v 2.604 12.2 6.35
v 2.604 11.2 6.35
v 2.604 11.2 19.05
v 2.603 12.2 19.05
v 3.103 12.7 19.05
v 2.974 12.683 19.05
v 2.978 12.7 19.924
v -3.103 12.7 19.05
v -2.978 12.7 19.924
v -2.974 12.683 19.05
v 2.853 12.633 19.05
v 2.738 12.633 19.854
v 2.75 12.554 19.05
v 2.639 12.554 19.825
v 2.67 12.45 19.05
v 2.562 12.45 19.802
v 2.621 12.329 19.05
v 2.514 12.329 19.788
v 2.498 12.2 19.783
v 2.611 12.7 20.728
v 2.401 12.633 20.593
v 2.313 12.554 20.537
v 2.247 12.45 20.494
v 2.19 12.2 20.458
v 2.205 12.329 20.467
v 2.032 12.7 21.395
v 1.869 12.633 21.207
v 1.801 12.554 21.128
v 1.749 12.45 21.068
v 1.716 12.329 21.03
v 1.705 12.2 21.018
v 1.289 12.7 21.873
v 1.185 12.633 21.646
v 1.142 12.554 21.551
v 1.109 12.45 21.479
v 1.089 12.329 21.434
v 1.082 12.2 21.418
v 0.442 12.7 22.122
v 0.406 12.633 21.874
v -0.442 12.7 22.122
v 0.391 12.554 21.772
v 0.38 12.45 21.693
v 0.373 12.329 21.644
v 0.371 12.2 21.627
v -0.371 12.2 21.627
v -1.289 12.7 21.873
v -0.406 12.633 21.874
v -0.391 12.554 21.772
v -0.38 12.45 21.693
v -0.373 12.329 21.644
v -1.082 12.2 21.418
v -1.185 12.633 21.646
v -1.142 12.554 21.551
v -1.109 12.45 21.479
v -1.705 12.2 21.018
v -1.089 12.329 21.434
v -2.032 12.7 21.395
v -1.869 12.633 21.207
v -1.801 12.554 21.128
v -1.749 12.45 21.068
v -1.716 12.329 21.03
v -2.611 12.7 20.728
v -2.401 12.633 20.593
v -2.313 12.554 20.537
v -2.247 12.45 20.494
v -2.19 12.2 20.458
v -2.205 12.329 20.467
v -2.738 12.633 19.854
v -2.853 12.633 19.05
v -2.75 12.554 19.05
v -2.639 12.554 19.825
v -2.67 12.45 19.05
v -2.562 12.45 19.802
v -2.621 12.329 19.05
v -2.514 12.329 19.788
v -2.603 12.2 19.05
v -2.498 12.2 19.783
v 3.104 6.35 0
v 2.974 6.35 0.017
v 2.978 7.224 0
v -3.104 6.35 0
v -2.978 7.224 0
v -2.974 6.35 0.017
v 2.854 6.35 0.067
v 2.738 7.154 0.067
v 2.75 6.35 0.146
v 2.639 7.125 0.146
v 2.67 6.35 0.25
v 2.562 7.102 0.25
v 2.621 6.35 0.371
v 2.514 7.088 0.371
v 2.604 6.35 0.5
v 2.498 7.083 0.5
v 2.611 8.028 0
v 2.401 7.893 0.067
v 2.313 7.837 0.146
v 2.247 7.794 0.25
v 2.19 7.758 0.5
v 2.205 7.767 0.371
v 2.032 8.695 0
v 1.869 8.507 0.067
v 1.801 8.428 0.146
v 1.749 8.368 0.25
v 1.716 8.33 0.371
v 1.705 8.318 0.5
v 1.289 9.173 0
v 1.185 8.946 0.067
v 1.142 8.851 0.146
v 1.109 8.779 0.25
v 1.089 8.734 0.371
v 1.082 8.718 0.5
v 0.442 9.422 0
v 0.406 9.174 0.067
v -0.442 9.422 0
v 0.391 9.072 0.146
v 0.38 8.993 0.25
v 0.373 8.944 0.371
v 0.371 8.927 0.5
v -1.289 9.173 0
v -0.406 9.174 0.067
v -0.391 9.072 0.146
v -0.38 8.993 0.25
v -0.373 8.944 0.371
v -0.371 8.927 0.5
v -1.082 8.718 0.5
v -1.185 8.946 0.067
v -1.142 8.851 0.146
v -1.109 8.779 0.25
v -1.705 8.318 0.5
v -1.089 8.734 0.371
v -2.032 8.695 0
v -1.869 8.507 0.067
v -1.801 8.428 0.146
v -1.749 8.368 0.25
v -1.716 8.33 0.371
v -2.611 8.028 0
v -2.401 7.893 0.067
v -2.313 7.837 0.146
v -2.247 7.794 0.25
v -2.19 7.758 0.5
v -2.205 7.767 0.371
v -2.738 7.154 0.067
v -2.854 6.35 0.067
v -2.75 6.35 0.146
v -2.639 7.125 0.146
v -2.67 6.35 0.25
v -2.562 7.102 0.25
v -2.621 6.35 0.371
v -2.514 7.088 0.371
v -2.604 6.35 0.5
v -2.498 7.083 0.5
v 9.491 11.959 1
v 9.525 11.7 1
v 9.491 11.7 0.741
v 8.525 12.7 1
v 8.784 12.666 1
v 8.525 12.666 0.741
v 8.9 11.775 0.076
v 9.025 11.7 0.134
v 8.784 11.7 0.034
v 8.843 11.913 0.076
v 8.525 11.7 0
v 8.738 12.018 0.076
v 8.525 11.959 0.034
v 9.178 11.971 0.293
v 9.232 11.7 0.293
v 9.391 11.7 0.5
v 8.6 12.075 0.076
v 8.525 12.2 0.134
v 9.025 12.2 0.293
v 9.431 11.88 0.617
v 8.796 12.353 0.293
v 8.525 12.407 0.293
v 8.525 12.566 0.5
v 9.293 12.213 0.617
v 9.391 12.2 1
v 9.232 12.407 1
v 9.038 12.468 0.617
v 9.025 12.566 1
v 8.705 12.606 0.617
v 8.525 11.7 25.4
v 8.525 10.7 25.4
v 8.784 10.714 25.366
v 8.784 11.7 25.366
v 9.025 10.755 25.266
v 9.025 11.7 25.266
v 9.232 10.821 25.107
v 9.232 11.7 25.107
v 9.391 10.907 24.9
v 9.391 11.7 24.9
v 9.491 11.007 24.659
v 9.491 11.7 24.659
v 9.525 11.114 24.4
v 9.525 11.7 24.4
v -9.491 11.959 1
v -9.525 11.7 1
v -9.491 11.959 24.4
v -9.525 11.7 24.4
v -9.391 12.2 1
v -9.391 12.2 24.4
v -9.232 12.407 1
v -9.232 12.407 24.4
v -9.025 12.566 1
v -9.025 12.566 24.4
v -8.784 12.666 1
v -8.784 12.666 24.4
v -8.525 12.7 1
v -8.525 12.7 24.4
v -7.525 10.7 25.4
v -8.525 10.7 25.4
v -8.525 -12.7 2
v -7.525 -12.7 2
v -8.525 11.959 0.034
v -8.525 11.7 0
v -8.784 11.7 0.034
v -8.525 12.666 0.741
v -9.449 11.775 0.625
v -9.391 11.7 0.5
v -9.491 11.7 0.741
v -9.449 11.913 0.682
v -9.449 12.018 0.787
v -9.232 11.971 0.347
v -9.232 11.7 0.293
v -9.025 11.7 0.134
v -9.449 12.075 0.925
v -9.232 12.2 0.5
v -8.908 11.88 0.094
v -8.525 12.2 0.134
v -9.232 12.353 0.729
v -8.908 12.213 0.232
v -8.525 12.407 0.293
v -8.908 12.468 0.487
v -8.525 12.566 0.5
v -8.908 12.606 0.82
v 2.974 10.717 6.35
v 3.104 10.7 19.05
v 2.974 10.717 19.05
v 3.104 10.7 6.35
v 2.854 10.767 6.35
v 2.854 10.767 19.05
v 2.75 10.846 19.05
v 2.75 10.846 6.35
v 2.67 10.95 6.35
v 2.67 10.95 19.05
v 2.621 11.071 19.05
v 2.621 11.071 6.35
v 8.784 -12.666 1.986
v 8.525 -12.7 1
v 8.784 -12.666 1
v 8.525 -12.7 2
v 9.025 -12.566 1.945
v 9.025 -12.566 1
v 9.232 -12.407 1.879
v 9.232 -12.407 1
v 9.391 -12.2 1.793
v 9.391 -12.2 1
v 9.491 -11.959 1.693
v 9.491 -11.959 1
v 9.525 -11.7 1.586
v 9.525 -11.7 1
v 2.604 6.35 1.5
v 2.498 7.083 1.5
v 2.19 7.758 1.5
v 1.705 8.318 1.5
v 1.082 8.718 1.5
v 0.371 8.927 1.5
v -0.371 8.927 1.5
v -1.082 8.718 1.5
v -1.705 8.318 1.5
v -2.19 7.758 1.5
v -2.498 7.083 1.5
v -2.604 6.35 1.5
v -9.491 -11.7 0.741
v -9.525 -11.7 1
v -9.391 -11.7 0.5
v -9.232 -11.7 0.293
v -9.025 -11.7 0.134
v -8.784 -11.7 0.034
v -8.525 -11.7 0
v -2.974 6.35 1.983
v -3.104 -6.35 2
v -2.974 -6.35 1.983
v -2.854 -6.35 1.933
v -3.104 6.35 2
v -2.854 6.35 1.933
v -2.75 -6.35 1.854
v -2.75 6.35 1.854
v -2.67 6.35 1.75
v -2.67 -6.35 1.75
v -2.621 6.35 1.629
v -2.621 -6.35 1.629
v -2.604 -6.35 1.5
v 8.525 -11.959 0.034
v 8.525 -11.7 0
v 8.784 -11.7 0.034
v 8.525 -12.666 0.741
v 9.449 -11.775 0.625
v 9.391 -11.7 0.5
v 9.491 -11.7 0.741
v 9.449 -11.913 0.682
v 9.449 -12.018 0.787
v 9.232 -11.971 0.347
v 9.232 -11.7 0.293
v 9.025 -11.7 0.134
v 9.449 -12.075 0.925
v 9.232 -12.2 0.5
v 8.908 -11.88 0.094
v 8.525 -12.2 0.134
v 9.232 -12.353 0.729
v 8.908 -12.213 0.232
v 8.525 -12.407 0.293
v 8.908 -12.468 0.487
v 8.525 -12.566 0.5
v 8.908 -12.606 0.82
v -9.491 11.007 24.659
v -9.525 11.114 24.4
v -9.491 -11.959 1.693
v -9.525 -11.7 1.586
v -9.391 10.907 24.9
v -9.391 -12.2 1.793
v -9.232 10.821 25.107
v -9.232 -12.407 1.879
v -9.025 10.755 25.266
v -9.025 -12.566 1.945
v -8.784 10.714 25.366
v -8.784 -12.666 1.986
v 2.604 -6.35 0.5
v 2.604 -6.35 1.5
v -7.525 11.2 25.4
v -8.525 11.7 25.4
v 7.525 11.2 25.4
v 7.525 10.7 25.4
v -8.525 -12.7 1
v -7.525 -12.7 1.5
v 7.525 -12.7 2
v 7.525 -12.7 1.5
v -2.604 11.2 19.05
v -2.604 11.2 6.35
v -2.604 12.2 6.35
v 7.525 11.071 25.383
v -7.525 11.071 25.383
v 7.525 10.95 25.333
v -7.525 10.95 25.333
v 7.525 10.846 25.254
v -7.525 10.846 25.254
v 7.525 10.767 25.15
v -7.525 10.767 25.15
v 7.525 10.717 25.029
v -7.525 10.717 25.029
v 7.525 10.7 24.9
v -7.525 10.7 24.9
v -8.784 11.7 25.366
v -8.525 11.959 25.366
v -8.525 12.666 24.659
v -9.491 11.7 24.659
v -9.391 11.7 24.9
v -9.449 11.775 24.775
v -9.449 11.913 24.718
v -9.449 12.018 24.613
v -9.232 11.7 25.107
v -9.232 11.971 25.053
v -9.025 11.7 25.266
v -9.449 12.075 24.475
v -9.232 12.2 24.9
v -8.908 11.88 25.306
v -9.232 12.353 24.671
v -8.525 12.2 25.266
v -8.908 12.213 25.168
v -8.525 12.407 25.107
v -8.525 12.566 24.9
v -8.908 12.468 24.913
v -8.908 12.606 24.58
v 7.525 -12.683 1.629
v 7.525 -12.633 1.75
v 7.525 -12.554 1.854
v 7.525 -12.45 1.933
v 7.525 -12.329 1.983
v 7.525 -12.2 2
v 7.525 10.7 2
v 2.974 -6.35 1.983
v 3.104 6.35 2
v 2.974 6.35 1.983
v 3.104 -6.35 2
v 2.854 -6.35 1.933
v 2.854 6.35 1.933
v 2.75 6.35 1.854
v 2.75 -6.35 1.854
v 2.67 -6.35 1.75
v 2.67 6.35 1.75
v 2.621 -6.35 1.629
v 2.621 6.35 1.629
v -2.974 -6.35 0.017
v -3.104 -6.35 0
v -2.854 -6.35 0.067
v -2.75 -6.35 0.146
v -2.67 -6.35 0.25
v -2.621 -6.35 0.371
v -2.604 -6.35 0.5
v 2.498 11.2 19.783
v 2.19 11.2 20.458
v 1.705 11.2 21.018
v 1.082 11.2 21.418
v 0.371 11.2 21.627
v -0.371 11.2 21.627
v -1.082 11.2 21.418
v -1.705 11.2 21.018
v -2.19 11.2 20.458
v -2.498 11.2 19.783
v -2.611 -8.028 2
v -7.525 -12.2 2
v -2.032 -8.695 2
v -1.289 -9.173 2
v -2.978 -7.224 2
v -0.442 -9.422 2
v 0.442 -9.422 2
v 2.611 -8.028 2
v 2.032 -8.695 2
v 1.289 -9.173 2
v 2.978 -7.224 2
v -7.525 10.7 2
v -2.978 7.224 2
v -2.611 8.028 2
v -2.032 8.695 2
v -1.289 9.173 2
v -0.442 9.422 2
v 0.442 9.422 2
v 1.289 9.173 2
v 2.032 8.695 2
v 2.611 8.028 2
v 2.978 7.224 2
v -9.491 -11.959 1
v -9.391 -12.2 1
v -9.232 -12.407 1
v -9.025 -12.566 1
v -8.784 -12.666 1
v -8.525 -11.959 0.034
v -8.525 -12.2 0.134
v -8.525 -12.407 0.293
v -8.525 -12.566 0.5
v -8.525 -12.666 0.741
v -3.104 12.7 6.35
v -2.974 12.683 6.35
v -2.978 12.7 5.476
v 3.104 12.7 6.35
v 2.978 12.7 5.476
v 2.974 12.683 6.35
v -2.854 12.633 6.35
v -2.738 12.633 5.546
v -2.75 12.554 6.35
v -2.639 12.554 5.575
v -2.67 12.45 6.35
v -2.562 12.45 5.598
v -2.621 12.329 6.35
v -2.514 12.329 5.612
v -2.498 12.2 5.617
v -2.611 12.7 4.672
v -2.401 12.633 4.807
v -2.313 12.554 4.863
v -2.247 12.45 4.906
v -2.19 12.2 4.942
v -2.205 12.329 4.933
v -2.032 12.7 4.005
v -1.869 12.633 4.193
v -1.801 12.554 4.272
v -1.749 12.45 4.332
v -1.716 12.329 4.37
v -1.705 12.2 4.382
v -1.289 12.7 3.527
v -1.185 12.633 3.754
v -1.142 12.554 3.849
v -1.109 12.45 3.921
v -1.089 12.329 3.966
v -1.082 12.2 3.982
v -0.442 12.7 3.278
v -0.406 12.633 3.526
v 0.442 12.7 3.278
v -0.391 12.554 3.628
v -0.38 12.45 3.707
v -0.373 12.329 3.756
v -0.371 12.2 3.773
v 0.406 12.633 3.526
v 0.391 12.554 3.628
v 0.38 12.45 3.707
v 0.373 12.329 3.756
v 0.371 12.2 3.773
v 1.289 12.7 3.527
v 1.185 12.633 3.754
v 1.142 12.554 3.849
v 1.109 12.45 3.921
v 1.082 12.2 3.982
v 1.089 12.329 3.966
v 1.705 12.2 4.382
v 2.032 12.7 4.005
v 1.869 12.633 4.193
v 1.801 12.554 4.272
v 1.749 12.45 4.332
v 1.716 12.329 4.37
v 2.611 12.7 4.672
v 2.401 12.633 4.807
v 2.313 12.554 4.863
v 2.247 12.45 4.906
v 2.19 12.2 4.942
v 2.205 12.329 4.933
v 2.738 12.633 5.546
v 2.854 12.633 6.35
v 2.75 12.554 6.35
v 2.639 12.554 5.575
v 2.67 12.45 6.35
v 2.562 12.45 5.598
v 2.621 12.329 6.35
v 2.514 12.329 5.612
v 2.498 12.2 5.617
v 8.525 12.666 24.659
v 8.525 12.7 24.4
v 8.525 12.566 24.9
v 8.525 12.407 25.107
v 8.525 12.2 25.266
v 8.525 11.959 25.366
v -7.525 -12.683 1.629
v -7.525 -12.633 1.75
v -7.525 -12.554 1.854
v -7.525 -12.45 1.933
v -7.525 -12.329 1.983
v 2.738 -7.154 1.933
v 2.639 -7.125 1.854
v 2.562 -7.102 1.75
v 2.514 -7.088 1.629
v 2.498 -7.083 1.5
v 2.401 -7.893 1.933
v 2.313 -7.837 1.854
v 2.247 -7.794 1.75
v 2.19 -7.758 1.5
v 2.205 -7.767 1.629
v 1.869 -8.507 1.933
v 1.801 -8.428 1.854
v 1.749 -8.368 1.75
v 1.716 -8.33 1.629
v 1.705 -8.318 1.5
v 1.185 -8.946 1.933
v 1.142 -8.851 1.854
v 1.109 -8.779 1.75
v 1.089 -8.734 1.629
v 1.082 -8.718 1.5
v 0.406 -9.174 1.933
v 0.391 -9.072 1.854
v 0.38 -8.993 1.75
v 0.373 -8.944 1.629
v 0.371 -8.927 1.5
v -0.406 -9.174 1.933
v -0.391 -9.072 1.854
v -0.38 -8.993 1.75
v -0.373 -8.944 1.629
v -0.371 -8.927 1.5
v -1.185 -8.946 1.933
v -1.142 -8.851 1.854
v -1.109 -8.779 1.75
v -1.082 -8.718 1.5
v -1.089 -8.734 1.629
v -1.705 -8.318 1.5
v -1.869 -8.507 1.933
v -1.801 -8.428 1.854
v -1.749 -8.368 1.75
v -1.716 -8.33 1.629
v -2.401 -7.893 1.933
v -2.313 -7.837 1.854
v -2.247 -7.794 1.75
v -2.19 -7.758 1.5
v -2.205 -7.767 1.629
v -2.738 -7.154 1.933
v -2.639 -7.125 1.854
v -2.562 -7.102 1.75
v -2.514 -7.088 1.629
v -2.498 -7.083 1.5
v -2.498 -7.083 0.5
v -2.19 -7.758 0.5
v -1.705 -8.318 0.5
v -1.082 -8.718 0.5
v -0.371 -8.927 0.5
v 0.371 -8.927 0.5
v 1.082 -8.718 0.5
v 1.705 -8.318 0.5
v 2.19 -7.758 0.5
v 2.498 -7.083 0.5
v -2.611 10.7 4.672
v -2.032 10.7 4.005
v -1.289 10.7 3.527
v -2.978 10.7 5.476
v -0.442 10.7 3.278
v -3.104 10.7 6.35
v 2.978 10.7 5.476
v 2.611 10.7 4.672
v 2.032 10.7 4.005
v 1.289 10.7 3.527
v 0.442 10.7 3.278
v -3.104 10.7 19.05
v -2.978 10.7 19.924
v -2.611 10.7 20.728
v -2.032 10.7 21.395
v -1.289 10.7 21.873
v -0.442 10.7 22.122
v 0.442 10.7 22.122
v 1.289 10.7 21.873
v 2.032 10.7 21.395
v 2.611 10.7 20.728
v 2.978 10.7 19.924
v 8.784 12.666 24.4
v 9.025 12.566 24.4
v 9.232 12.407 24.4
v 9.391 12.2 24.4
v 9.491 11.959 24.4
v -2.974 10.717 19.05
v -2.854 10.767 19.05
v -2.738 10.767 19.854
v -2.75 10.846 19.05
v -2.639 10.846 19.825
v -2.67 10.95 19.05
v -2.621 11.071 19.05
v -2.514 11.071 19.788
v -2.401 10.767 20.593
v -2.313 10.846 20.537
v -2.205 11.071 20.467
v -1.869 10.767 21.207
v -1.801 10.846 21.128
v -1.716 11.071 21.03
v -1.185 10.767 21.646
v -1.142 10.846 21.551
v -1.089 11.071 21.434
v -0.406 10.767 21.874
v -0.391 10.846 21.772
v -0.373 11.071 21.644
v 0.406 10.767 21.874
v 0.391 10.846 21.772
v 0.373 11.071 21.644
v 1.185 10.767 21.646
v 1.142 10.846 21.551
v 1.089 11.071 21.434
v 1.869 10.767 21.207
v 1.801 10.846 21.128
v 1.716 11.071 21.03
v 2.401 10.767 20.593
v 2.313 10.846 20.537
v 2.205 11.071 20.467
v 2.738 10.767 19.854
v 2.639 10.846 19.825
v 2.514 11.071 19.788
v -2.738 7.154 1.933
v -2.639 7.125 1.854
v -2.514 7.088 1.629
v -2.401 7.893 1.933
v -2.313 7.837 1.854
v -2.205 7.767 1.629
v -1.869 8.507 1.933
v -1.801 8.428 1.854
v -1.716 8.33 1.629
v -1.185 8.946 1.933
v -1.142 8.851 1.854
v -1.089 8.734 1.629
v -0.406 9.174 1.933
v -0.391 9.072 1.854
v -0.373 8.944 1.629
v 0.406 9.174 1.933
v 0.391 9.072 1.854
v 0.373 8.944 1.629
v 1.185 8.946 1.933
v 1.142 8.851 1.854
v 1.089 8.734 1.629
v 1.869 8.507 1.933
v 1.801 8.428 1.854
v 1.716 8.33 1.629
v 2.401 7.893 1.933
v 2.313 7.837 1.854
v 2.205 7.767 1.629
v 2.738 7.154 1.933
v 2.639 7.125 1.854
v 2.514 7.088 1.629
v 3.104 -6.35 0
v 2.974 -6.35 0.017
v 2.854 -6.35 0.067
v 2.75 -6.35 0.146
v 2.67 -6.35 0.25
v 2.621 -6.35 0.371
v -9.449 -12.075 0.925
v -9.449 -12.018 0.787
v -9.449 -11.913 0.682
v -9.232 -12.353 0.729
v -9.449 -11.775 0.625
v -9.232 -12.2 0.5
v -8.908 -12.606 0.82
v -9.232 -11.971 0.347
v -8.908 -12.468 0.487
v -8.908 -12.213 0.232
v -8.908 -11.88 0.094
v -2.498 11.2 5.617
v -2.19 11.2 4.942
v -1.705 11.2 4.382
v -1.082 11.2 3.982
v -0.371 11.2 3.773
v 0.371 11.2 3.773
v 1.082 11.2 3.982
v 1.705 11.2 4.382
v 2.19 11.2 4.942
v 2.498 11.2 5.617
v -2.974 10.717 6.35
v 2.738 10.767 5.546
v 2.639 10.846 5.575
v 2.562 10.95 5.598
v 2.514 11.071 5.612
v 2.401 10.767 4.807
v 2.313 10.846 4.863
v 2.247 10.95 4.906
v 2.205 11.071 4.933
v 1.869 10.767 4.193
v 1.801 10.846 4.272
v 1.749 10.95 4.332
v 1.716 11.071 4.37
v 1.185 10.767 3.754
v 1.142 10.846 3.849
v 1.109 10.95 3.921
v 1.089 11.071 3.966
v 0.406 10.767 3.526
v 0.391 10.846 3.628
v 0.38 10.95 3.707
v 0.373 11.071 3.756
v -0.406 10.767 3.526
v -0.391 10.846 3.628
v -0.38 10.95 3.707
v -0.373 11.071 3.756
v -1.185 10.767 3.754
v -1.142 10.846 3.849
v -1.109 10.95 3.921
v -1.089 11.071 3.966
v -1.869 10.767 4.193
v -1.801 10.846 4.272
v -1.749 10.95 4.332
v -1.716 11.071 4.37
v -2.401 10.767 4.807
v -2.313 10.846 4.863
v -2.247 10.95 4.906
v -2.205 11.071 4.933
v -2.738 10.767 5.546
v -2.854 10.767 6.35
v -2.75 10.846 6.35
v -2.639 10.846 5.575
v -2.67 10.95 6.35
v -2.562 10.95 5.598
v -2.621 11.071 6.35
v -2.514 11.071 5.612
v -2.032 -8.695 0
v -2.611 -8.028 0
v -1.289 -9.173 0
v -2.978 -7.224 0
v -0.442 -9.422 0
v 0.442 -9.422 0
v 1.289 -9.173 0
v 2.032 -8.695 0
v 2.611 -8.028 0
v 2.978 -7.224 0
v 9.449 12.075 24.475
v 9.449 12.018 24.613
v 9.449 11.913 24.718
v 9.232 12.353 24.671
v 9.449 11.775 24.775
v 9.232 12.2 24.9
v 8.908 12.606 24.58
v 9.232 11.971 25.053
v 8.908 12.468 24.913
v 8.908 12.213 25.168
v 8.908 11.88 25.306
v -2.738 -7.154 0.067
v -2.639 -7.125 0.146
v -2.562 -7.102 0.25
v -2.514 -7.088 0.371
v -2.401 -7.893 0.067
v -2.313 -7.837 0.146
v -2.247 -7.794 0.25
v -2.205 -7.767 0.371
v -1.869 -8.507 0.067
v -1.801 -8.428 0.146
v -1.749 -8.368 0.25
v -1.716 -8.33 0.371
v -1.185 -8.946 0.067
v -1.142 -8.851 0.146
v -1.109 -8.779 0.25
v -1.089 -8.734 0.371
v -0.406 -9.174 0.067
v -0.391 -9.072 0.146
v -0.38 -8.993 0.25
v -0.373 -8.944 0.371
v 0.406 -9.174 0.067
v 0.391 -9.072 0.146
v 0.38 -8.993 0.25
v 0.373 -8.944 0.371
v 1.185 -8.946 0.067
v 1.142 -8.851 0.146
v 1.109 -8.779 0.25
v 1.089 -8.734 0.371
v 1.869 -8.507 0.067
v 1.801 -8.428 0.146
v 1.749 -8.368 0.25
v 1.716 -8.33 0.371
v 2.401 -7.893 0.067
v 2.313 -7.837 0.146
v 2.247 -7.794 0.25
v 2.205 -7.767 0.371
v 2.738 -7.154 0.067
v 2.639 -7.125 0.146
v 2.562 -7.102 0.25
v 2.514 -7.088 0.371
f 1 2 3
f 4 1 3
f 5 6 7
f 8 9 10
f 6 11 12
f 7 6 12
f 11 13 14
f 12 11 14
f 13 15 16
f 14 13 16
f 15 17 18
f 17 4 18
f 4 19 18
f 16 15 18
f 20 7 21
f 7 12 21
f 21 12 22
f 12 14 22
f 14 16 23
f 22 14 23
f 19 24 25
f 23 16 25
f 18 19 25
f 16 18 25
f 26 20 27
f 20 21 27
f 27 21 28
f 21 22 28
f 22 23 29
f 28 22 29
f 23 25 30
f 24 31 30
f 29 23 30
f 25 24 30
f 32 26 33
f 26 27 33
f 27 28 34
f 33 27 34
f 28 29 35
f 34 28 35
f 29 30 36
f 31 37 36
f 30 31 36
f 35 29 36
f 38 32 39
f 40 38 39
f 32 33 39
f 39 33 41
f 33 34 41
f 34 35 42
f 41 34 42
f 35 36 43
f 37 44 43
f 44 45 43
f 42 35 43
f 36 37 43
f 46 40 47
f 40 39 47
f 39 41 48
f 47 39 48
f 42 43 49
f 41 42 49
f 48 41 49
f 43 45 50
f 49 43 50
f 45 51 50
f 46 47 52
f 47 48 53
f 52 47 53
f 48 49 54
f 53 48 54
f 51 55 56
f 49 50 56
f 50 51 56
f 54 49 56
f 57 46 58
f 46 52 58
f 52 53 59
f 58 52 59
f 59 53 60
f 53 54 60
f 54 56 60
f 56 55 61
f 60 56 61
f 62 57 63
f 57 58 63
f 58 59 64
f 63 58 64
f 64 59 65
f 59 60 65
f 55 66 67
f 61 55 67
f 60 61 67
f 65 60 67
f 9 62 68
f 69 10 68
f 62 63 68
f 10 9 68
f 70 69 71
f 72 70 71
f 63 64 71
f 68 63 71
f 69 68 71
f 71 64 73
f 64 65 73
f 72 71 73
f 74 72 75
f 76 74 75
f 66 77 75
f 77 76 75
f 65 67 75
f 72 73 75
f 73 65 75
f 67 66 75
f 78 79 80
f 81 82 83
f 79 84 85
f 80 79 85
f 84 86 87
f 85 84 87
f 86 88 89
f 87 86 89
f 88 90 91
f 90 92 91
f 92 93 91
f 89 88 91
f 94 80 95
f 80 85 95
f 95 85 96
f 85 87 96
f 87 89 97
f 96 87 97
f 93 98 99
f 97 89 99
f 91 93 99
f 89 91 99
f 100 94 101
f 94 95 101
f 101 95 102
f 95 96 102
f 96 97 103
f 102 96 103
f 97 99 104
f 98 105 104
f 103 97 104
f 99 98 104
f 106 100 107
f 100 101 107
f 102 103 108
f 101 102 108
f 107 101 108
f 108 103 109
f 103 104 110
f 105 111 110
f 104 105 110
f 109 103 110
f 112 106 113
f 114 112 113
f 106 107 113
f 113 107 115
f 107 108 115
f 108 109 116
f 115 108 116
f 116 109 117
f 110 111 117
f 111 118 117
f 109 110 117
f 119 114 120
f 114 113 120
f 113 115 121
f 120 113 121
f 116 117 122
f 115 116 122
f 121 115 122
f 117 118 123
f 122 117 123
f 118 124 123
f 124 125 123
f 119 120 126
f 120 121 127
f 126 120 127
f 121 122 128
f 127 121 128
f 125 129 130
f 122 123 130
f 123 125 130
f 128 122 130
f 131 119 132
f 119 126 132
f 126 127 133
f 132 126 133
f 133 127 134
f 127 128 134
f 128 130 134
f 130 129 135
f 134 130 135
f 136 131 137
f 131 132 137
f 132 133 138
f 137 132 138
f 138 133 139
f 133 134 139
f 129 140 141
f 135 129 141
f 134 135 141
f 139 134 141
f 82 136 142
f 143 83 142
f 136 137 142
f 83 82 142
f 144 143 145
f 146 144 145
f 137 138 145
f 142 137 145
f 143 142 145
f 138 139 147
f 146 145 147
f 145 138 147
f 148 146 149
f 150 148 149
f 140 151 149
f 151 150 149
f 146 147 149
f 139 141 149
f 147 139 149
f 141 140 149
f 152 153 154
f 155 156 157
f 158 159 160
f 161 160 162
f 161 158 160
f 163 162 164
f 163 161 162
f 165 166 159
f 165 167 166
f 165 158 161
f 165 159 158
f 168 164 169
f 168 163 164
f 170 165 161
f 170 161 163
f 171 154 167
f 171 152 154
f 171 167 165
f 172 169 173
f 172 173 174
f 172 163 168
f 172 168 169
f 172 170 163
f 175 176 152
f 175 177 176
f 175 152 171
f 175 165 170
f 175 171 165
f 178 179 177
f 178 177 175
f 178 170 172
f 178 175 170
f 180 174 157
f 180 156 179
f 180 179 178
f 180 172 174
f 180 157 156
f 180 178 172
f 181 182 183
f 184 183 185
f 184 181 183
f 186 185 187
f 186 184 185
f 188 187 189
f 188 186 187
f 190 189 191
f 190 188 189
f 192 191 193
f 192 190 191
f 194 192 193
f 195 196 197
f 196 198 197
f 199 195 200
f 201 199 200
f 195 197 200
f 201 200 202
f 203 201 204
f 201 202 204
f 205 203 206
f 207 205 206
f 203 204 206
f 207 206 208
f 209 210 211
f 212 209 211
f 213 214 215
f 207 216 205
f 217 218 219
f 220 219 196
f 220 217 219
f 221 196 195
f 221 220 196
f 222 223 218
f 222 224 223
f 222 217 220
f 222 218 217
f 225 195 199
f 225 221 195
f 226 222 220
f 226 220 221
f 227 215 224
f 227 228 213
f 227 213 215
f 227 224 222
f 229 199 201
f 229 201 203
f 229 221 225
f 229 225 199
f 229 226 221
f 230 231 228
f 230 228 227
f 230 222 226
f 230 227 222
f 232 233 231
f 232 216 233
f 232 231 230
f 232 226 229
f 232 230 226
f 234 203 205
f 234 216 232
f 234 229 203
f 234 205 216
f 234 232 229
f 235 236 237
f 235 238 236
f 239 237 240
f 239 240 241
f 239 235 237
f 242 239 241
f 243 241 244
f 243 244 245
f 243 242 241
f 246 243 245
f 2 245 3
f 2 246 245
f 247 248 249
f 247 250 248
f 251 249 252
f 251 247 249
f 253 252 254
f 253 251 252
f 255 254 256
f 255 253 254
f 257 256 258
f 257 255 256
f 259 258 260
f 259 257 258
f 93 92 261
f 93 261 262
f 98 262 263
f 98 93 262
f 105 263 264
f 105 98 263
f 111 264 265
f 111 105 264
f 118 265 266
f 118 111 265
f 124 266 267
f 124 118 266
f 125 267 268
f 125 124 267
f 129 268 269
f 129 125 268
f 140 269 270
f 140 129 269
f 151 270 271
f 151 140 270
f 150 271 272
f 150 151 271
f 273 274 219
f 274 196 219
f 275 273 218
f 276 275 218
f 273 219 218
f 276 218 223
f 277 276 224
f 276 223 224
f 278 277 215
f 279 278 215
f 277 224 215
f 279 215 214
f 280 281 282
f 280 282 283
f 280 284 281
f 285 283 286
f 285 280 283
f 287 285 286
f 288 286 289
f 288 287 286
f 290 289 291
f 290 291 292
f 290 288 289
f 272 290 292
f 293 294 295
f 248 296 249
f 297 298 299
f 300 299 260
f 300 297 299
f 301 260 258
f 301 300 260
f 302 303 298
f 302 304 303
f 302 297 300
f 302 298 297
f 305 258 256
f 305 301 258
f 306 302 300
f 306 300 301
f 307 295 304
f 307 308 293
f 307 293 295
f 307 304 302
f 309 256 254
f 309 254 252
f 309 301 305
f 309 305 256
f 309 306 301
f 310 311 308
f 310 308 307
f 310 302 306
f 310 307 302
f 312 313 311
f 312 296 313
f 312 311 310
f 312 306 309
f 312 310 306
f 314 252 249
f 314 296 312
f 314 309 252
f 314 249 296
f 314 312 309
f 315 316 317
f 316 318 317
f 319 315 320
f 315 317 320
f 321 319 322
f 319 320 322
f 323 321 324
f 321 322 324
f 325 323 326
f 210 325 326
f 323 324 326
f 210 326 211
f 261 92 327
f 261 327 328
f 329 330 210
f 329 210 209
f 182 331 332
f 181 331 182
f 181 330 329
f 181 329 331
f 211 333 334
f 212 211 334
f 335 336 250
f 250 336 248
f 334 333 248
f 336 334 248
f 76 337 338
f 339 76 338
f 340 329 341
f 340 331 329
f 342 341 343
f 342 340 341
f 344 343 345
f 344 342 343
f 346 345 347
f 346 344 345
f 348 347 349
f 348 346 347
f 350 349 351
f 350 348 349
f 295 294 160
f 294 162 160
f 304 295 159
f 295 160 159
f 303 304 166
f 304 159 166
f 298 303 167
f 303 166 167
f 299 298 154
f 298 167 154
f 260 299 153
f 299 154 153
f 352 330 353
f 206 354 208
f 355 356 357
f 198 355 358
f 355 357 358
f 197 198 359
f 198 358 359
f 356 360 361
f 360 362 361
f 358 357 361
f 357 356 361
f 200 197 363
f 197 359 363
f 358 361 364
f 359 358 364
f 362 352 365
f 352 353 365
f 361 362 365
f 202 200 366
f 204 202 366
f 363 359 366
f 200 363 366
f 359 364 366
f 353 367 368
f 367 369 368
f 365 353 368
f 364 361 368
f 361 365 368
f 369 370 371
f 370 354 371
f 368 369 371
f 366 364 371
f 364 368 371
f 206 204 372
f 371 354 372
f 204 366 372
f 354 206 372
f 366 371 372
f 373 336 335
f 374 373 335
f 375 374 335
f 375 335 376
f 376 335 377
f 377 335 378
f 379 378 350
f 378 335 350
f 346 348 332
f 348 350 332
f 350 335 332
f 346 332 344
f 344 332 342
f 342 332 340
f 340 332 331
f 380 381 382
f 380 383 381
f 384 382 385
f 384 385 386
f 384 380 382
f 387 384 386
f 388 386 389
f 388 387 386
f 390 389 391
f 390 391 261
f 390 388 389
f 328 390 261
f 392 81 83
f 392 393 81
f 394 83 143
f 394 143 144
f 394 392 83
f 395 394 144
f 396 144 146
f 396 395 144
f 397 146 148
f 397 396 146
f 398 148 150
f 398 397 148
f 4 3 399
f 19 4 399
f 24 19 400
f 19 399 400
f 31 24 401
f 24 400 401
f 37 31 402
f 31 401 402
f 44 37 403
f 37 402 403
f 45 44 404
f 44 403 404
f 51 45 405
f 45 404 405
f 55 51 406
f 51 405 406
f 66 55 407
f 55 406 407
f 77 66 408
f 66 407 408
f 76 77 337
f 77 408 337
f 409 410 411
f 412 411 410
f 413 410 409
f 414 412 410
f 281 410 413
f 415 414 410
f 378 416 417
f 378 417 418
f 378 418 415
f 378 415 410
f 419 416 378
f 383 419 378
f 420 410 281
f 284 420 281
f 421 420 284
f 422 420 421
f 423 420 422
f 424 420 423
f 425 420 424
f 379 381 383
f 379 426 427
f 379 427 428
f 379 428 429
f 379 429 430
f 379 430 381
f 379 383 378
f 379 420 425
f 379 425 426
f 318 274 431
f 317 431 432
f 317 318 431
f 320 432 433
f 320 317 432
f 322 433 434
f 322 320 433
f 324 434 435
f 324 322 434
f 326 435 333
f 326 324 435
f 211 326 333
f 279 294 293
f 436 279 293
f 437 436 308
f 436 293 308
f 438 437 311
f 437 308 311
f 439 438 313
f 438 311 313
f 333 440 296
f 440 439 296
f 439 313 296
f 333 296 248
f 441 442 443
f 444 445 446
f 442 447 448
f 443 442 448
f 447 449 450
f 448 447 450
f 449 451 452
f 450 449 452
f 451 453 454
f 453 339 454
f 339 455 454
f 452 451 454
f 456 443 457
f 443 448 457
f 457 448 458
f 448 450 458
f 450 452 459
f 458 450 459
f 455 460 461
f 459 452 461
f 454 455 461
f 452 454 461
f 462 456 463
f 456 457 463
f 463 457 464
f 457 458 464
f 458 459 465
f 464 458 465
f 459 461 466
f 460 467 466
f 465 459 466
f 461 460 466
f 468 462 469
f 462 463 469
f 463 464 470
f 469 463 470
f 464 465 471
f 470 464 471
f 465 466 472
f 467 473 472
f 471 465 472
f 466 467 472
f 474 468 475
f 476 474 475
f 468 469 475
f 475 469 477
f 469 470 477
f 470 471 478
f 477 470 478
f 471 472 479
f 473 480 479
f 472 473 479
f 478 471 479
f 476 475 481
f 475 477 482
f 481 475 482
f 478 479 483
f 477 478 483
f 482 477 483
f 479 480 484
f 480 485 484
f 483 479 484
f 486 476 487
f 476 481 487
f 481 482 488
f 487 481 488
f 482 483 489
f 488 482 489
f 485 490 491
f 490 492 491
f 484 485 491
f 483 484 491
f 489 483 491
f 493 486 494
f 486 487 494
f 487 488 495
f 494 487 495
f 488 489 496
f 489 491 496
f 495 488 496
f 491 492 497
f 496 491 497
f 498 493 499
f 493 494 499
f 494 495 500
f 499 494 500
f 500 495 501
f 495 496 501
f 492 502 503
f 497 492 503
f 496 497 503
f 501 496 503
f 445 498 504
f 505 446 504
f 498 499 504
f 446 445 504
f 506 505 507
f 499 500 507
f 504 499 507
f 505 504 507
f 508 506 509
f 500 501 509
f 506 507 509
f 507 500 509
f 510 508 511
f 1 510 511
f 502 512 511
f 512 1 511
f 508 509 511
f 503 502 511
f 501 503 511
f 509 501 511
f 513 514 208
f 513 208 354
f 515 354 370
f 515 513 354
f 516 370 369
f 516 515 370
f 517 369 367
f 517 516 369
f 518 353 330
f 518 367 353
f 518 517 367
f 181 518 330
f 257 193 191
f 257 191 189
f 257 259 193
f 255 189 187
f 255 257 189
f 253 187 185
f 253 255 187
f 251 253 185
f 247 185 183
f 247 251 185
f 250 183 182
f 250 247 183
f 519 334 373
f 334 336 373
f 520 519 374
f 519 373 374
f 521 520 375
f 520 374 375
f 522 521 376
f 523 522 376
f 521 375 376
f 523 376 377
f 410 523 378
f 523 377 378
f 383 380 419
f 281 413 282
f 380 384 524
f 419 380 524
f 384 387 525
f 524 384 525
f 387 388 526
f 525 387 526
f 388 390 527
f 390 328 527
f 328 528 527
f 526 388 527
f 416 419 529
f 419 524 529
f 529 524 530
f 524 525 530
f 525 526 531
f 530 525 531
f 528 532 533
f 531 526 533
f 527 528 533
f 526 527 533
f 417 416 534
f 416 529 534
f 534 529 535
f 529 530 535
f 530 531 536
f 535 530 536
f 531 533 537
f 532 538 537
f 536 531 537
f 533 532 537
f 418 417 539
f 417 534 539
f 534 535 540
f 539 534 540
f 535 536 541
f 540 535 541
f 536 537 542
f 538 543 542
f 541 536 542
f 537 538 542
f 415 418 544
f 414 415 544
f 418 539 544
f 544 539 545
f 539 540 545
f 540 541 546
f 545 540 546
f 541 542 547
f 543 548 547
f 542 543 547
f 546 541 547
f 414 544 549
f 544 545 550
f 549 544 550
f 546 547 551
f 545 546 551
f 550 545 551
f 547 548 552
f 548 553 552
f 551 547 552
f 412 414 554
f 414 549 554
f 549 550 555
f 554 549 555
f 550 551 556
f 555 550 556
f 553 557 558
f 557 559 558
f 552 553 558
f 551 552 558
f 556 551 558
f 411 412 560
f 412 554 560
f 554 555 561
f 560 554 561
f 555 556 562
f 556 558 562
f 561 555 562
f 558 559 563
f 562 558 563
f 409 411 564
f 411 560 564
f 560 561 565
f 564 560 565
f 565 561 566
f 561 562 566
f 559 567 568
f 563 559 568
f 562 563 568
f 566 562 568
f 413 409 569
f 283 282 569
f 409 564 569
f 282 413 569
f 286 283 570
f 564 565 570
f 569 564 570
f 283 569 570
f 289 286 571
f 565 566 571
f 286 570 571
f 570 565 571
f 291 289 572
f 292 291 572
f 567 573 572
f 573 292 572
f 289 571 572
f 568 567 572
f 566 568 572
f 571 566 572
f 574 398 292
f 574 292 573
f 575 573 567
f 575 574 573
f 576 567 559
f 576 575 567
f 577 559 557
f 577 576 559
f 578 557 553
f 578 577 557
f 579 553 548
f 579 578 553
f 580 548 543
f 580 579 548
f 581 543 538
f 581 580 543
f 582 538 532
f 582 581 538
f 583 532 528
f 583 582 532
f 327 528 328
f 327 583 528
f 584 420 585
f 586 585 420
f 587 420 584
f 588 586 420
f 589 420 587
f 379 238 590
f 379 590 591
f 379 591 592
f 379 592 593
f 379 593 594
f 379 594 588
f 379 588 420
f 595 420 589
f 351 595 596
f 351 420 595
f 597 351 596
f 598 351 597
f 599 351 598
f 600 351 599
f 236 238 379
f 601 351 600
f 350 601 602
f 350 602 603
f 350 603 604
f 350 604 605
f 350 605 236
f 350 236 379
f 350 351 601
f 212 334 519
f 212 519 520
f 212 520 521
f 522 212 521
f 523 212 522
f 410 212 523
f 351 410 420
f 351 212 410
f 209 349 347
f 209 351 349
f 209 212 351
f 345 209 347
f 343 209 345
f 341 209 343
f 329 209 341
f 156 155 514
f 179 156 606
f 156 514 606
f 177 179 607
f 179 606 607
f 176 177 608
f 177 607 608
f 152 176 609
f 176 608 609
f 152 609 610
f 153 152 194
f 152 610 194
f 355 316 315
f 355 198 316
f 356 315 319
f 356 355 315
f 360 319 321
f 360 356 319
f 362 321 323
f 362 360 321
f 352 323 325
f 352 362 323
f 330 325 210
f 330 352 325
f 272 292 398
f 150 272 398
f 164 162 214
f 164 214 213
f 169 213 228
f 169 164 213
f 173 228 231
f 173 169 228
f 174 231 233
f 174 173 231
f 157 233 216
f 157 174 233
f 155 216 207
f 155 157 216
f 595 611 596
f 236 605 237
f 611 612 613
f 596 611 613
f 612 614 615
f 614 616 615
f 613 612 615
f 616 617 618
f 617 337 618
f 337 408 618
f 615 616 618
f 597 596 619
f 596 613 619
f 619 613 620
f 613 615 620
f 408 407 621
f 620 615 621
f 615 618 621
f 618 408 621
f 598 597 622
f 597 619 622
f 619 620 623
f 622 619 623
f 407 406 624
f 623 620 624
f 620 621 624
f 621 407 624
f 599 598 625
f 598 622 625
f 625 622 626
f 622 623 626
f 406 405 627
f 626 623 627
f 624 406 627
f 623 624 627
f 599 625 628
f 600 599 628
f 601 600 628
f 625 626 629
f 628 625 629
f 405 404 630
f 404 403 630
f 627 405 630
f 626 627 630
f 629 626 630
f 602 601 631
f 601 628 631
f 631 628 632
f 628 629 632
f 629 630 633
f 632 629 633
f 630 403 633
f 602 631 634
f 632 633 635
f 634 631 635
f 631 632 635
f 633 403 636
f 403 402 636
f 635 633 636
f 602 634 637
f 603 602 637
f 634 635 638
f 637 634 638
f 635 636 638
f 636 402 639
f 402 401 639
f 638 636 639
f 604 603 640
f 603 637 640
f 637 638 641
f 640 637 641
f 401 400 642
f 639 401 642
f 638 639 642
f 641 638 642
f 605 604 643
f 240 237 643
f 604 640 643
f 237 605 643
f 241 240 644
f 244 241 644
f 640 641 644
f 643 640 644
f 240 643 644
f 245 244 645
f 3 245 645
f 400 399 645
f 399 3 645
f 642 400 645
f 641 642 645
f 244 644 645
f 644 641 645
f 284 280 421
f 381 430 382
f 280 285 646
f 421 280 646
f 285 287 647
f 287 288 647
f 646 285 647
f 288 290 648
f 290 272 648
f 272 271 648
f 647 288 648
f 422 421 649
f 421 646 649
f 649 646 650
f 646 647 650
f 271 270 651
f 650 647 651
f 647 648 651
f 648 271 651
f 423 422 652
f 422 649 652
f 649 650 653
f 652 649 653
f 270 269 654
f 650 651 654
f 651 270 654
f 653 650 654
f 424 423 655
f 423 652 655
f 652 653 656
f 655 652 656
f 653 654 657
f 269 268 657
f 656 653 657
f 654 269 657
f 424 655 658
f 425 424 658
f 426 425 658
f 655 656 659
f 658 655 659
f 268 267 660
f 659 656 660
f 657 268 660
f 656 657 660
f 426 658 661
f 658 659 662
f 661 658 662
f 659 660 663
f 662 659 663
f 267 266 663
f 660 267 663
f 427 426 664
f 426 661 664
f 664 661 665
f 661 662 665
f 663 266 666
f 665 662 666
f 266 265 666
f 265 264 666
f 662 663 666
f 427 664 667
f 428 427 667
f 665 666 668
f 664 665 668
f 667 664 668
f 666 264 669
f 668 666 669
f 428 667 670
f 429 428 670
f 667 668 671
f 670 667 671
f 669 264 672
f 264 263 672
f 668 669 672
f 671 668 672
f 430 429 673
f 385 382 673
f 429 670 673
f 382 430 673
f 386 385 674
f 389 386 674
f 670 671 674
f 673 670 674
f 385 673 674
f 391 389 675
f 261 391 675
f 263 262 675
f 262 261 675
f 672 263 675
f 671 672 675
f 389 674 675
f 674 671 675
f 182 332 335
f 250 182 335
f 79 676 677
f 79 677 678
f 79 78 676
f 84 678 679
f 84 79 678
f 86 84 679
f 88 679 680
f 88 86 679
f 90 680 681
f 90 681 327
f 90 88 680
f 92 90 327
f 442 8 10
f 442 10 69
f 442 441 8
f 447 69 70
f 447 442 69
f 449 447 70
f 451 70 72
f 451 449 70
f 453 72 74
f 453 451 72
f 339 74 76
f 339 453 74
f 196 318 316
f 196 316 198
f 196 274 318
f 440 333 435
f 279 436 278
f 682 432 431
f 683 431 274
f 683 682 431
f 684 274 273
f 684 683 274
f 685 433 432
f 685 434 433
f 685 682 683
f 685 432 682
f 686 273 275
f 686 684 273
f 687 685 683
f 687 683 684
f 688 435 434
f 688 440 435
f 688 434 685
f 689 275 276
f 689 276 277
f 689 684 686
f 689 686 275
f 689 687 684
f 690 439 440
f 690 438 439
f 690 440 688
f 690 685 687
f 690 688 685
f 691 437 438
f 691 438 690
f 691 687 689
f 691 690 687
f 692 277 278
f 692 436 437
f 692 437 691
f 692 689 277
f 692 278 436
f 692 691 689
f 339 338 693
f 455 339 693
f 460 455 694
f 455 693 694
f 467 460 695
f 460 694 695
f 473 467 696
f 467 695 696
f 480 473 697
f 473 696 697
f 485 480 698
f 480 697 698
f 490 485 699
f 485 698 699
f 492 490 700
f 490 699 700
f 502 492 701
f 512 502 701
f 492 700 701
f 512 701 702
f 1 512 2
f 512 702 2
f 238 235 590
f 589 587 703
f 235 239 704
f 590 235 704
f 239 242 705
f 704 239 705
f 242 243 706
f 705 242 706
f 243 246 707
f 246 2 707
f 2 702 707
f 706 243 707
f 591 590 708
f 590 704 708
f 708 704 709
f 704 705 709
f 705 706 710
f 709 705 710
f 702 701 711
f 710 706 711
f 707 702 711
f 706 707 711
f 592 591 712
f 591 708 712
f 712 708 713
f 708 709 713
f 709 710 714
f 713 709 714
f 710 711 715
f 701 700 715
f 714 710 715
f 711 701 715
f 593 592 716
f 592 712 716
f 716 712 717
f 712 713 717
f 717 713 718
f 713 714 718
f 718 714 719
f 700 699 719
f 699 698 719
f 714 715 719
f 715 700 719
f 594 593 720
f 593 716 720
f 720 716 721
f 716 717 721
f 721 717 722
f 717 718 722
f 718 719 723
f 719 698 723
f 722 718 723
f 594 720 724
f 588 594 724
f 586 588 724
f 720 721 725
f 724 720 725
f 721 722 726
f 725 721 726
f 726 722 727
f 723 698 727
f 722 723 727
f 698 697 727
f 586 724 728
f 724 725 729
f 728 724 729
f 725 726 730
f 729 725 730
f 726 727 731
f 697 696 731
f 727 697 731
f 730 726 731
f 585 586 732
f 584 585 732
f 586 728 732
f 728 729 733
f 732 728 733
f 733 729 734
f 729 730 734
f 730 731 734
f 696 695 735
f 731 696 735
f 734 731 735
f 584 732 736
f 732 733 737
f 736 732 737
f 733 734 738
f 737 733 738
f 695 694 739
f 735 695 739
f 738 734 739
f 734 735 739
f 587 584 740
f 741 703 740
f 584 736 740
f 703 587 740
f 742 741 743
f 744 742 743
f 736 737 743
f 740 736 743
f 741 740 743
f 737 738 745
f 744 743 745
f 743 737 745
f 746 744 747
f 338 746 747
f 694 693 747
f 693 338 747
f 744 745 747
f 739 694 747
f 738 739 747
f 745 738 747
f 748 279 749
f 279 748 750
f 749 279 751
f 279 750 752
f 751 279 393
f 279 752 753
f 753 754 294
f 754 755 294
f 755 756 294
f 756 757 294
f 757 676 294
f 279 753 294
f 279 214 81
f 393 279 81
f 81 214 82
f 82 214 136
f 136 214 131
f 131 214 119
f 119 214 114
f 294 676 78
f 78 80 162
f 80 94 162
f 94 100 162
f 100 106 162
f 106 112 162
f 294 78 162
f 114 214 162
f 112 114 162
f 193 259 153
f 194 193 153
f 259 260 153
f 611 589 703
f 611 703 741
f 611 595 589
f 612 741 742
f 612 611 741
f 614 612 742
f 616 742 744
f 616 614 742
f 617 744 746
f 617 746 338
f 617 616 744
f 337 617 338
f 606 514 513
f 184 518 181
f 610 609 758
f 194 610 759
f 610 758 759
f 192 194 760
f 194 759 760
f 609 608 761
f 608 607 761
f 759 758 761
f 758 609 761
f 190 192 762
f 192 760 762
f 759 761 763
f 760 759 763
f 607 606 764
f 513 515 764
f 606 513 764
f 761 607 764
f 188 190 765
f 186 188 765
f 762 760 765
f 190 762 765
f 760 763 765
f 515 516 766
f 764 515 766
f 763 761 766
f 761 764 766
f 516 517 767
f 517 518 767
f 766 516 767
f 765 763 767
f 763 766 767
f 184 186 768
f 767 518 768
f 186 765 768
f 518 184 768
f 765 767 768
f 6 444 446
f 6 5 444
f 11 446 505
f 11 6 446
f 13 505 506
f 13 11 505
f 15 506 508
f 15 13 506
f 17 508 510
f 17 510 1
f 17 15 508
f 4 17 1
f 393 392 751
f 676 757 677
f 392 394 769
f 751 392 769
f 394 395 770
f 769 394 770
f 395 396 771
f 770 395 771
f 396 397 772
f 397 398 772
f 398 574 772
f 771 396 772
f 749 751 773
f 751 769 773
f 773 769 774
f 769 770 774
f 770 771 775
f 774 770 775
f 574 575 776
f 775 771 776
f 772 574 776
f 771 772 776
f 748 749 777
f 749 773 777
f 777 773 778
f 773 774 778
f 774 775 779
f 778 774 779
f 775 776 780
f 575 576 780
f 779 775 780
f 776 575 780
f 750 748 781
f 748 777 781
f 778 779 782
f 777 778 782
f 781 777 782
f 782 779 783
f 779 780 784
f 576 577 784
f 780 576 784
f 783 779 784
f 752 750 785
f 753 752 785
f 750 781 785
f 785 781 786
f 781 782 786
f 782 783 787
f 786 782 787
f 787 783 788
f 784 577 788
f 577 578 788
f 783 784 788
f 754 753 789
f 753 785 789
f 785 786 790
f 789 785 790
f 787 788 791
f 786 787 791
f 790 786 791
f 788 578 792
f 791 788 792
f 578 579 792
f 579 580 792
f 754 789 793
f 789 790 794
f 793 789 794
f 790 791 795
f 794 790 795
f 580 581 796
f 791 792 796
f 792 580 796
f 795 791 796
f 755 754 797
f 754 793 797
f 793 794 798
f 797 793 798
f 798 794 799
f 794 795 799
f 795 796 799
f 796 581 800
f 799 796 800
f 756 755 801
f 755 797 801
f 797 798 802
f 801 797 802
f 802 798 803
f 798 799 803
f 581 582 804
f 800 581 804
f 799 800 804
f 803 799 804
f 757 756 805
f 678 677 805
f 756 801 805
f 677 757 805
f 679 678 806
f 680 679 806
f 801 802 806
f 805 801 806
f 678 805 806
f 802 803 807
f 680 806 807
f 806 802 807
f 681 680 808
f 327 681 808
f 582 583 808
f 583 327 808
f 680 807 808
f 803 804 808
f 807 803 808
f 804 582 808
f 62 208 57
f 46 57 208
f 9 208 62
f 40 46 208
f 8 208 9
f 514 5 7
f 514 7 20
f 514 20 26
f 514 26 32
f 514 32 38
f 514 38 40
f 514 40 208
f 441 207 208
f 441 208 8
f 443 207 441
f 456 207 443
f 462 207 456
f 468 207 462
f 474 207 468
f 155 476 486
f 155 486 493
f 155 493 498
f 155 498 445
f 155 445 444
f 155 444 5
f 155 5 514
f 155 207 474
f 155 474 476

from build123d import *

# Parameters (mm, degrees)
SKETCH010_W     = 19.05
SKETCH010_H     = 25.4
PAD006_DEPTH    = 25.4
POCKET002_DEPTH = 25.401
SKETCH012_W     = 15.05
SKETCH012_H     = 23.4
POCKET003_DEPTH = 23.4
POCKET004_DEPTH = 19.051
FILLET003_R     = 1
FILLET004_R     = 0.5


with BuildPart() as part:
    # Sketch010 → Pad006 (new body)
    with BuildSketch(Plane.XY):
        Rectangle(SKETCH010_W, SKETCH010_H)
        with BuildLine():
            ThreePointArc((2.6035, 6.35), (0, 8.9535), (-2.6035, 6.35))
            Line((-2.6035, 6.35), (-2.6035, -6.35))
            ThreePointArc((-2.6035, -6.35), (0, -8.9535), (2.6035, -6.35))
            Line((2.6035, -6.35), (2.6035, 6.35))
        make_face(mode=Mode.SUBTRACT)
    extrude(amount=PAD006_DEPTH)

    # Sketch011 (on Face4 of Pad006) → Pocket002 (cut, through all)
    with BuildSketch(Plane.XZ.offset(12.7)):
        with BuildLine():
            ThreePointArc((2.6035, 19.05), (0, 21.6535), (-2.6035, 19.05))
            Line((-2.6035, 19.05), (-2.6035, 6.35))
            ThreePointArc((-2.6035, 6.35), (0, 3.7465), (2.6035, 6.35))
            Line((2.6035, 6.35), (2.6035, 19.05))
        make_face()
    extrude(amount=-POCKET002_DEPTH, mode=Mode.SUBTRACT)

    # Sketch012 (on Face5 of Pocket002) → Pocket003 (cut)
    with BuildSketch(Plane.XY.offset(25.4)):
        with Locations((0, -1)):
            Rectangle(SKETCH012_W, SKETCH012_H)
    extrude(amount=-POCKET003_DEPTH, mode=Mode.SUBTRACT)

    # Sketch013 (on Face9 of Pocket003) → Pocket004 (cut, through all)
    with BuildSketch(Plane(origin=(-9.525, 0, 0), x_dir=(0, -1, 0), z_dir=(-1, 0, 0))):
        Polygon((-10.7, 25.4), (12.7, 2), (12.7, 25.4), align=None)
    extrude(amount=-POCKET004_DEPTH, mode=Mode.SUBTRACT)

    # Fillet003
    fillet003_edges = [part.edges().sort_by_distance(p)[0] for p in [
        (0, -12.7, 0),
        (0, 12.7, 25.4),
        (9.525, -1, 13.7),
        (9.525, 12.7, 12.7),
        (9.525, 0, 0),
        (0, 12.7, 0),
        (-9.525, -1, 13.7),
        (9.525, -12.7, 1),
        (-9.525, -12.7, 1),
        (9.525, 11.7, 25.4),
        (-9.525, 11.7, 25.4),
        (-9.525, 0, 0),
        (-9.525, 12.7, 12.7),
    ]]
    fillet(fillet003_edges, radius=FILLET003_R)

    # Fillet004
    fillet004_edges = [part.edges().sort_by_distance(p)[0] for p in [
        (0, -12.7, 2),
        (0, 10.7, 25.4),
        (2.6035, 0, 2),
        (2.6035, 10.7, 12.7),
        (0, 12.7, 21.6535),
        (0, -8.9535, 0),
    ]]
    fillet(fillet004_edges, radius=FILLET004_R)


solid = part.part
